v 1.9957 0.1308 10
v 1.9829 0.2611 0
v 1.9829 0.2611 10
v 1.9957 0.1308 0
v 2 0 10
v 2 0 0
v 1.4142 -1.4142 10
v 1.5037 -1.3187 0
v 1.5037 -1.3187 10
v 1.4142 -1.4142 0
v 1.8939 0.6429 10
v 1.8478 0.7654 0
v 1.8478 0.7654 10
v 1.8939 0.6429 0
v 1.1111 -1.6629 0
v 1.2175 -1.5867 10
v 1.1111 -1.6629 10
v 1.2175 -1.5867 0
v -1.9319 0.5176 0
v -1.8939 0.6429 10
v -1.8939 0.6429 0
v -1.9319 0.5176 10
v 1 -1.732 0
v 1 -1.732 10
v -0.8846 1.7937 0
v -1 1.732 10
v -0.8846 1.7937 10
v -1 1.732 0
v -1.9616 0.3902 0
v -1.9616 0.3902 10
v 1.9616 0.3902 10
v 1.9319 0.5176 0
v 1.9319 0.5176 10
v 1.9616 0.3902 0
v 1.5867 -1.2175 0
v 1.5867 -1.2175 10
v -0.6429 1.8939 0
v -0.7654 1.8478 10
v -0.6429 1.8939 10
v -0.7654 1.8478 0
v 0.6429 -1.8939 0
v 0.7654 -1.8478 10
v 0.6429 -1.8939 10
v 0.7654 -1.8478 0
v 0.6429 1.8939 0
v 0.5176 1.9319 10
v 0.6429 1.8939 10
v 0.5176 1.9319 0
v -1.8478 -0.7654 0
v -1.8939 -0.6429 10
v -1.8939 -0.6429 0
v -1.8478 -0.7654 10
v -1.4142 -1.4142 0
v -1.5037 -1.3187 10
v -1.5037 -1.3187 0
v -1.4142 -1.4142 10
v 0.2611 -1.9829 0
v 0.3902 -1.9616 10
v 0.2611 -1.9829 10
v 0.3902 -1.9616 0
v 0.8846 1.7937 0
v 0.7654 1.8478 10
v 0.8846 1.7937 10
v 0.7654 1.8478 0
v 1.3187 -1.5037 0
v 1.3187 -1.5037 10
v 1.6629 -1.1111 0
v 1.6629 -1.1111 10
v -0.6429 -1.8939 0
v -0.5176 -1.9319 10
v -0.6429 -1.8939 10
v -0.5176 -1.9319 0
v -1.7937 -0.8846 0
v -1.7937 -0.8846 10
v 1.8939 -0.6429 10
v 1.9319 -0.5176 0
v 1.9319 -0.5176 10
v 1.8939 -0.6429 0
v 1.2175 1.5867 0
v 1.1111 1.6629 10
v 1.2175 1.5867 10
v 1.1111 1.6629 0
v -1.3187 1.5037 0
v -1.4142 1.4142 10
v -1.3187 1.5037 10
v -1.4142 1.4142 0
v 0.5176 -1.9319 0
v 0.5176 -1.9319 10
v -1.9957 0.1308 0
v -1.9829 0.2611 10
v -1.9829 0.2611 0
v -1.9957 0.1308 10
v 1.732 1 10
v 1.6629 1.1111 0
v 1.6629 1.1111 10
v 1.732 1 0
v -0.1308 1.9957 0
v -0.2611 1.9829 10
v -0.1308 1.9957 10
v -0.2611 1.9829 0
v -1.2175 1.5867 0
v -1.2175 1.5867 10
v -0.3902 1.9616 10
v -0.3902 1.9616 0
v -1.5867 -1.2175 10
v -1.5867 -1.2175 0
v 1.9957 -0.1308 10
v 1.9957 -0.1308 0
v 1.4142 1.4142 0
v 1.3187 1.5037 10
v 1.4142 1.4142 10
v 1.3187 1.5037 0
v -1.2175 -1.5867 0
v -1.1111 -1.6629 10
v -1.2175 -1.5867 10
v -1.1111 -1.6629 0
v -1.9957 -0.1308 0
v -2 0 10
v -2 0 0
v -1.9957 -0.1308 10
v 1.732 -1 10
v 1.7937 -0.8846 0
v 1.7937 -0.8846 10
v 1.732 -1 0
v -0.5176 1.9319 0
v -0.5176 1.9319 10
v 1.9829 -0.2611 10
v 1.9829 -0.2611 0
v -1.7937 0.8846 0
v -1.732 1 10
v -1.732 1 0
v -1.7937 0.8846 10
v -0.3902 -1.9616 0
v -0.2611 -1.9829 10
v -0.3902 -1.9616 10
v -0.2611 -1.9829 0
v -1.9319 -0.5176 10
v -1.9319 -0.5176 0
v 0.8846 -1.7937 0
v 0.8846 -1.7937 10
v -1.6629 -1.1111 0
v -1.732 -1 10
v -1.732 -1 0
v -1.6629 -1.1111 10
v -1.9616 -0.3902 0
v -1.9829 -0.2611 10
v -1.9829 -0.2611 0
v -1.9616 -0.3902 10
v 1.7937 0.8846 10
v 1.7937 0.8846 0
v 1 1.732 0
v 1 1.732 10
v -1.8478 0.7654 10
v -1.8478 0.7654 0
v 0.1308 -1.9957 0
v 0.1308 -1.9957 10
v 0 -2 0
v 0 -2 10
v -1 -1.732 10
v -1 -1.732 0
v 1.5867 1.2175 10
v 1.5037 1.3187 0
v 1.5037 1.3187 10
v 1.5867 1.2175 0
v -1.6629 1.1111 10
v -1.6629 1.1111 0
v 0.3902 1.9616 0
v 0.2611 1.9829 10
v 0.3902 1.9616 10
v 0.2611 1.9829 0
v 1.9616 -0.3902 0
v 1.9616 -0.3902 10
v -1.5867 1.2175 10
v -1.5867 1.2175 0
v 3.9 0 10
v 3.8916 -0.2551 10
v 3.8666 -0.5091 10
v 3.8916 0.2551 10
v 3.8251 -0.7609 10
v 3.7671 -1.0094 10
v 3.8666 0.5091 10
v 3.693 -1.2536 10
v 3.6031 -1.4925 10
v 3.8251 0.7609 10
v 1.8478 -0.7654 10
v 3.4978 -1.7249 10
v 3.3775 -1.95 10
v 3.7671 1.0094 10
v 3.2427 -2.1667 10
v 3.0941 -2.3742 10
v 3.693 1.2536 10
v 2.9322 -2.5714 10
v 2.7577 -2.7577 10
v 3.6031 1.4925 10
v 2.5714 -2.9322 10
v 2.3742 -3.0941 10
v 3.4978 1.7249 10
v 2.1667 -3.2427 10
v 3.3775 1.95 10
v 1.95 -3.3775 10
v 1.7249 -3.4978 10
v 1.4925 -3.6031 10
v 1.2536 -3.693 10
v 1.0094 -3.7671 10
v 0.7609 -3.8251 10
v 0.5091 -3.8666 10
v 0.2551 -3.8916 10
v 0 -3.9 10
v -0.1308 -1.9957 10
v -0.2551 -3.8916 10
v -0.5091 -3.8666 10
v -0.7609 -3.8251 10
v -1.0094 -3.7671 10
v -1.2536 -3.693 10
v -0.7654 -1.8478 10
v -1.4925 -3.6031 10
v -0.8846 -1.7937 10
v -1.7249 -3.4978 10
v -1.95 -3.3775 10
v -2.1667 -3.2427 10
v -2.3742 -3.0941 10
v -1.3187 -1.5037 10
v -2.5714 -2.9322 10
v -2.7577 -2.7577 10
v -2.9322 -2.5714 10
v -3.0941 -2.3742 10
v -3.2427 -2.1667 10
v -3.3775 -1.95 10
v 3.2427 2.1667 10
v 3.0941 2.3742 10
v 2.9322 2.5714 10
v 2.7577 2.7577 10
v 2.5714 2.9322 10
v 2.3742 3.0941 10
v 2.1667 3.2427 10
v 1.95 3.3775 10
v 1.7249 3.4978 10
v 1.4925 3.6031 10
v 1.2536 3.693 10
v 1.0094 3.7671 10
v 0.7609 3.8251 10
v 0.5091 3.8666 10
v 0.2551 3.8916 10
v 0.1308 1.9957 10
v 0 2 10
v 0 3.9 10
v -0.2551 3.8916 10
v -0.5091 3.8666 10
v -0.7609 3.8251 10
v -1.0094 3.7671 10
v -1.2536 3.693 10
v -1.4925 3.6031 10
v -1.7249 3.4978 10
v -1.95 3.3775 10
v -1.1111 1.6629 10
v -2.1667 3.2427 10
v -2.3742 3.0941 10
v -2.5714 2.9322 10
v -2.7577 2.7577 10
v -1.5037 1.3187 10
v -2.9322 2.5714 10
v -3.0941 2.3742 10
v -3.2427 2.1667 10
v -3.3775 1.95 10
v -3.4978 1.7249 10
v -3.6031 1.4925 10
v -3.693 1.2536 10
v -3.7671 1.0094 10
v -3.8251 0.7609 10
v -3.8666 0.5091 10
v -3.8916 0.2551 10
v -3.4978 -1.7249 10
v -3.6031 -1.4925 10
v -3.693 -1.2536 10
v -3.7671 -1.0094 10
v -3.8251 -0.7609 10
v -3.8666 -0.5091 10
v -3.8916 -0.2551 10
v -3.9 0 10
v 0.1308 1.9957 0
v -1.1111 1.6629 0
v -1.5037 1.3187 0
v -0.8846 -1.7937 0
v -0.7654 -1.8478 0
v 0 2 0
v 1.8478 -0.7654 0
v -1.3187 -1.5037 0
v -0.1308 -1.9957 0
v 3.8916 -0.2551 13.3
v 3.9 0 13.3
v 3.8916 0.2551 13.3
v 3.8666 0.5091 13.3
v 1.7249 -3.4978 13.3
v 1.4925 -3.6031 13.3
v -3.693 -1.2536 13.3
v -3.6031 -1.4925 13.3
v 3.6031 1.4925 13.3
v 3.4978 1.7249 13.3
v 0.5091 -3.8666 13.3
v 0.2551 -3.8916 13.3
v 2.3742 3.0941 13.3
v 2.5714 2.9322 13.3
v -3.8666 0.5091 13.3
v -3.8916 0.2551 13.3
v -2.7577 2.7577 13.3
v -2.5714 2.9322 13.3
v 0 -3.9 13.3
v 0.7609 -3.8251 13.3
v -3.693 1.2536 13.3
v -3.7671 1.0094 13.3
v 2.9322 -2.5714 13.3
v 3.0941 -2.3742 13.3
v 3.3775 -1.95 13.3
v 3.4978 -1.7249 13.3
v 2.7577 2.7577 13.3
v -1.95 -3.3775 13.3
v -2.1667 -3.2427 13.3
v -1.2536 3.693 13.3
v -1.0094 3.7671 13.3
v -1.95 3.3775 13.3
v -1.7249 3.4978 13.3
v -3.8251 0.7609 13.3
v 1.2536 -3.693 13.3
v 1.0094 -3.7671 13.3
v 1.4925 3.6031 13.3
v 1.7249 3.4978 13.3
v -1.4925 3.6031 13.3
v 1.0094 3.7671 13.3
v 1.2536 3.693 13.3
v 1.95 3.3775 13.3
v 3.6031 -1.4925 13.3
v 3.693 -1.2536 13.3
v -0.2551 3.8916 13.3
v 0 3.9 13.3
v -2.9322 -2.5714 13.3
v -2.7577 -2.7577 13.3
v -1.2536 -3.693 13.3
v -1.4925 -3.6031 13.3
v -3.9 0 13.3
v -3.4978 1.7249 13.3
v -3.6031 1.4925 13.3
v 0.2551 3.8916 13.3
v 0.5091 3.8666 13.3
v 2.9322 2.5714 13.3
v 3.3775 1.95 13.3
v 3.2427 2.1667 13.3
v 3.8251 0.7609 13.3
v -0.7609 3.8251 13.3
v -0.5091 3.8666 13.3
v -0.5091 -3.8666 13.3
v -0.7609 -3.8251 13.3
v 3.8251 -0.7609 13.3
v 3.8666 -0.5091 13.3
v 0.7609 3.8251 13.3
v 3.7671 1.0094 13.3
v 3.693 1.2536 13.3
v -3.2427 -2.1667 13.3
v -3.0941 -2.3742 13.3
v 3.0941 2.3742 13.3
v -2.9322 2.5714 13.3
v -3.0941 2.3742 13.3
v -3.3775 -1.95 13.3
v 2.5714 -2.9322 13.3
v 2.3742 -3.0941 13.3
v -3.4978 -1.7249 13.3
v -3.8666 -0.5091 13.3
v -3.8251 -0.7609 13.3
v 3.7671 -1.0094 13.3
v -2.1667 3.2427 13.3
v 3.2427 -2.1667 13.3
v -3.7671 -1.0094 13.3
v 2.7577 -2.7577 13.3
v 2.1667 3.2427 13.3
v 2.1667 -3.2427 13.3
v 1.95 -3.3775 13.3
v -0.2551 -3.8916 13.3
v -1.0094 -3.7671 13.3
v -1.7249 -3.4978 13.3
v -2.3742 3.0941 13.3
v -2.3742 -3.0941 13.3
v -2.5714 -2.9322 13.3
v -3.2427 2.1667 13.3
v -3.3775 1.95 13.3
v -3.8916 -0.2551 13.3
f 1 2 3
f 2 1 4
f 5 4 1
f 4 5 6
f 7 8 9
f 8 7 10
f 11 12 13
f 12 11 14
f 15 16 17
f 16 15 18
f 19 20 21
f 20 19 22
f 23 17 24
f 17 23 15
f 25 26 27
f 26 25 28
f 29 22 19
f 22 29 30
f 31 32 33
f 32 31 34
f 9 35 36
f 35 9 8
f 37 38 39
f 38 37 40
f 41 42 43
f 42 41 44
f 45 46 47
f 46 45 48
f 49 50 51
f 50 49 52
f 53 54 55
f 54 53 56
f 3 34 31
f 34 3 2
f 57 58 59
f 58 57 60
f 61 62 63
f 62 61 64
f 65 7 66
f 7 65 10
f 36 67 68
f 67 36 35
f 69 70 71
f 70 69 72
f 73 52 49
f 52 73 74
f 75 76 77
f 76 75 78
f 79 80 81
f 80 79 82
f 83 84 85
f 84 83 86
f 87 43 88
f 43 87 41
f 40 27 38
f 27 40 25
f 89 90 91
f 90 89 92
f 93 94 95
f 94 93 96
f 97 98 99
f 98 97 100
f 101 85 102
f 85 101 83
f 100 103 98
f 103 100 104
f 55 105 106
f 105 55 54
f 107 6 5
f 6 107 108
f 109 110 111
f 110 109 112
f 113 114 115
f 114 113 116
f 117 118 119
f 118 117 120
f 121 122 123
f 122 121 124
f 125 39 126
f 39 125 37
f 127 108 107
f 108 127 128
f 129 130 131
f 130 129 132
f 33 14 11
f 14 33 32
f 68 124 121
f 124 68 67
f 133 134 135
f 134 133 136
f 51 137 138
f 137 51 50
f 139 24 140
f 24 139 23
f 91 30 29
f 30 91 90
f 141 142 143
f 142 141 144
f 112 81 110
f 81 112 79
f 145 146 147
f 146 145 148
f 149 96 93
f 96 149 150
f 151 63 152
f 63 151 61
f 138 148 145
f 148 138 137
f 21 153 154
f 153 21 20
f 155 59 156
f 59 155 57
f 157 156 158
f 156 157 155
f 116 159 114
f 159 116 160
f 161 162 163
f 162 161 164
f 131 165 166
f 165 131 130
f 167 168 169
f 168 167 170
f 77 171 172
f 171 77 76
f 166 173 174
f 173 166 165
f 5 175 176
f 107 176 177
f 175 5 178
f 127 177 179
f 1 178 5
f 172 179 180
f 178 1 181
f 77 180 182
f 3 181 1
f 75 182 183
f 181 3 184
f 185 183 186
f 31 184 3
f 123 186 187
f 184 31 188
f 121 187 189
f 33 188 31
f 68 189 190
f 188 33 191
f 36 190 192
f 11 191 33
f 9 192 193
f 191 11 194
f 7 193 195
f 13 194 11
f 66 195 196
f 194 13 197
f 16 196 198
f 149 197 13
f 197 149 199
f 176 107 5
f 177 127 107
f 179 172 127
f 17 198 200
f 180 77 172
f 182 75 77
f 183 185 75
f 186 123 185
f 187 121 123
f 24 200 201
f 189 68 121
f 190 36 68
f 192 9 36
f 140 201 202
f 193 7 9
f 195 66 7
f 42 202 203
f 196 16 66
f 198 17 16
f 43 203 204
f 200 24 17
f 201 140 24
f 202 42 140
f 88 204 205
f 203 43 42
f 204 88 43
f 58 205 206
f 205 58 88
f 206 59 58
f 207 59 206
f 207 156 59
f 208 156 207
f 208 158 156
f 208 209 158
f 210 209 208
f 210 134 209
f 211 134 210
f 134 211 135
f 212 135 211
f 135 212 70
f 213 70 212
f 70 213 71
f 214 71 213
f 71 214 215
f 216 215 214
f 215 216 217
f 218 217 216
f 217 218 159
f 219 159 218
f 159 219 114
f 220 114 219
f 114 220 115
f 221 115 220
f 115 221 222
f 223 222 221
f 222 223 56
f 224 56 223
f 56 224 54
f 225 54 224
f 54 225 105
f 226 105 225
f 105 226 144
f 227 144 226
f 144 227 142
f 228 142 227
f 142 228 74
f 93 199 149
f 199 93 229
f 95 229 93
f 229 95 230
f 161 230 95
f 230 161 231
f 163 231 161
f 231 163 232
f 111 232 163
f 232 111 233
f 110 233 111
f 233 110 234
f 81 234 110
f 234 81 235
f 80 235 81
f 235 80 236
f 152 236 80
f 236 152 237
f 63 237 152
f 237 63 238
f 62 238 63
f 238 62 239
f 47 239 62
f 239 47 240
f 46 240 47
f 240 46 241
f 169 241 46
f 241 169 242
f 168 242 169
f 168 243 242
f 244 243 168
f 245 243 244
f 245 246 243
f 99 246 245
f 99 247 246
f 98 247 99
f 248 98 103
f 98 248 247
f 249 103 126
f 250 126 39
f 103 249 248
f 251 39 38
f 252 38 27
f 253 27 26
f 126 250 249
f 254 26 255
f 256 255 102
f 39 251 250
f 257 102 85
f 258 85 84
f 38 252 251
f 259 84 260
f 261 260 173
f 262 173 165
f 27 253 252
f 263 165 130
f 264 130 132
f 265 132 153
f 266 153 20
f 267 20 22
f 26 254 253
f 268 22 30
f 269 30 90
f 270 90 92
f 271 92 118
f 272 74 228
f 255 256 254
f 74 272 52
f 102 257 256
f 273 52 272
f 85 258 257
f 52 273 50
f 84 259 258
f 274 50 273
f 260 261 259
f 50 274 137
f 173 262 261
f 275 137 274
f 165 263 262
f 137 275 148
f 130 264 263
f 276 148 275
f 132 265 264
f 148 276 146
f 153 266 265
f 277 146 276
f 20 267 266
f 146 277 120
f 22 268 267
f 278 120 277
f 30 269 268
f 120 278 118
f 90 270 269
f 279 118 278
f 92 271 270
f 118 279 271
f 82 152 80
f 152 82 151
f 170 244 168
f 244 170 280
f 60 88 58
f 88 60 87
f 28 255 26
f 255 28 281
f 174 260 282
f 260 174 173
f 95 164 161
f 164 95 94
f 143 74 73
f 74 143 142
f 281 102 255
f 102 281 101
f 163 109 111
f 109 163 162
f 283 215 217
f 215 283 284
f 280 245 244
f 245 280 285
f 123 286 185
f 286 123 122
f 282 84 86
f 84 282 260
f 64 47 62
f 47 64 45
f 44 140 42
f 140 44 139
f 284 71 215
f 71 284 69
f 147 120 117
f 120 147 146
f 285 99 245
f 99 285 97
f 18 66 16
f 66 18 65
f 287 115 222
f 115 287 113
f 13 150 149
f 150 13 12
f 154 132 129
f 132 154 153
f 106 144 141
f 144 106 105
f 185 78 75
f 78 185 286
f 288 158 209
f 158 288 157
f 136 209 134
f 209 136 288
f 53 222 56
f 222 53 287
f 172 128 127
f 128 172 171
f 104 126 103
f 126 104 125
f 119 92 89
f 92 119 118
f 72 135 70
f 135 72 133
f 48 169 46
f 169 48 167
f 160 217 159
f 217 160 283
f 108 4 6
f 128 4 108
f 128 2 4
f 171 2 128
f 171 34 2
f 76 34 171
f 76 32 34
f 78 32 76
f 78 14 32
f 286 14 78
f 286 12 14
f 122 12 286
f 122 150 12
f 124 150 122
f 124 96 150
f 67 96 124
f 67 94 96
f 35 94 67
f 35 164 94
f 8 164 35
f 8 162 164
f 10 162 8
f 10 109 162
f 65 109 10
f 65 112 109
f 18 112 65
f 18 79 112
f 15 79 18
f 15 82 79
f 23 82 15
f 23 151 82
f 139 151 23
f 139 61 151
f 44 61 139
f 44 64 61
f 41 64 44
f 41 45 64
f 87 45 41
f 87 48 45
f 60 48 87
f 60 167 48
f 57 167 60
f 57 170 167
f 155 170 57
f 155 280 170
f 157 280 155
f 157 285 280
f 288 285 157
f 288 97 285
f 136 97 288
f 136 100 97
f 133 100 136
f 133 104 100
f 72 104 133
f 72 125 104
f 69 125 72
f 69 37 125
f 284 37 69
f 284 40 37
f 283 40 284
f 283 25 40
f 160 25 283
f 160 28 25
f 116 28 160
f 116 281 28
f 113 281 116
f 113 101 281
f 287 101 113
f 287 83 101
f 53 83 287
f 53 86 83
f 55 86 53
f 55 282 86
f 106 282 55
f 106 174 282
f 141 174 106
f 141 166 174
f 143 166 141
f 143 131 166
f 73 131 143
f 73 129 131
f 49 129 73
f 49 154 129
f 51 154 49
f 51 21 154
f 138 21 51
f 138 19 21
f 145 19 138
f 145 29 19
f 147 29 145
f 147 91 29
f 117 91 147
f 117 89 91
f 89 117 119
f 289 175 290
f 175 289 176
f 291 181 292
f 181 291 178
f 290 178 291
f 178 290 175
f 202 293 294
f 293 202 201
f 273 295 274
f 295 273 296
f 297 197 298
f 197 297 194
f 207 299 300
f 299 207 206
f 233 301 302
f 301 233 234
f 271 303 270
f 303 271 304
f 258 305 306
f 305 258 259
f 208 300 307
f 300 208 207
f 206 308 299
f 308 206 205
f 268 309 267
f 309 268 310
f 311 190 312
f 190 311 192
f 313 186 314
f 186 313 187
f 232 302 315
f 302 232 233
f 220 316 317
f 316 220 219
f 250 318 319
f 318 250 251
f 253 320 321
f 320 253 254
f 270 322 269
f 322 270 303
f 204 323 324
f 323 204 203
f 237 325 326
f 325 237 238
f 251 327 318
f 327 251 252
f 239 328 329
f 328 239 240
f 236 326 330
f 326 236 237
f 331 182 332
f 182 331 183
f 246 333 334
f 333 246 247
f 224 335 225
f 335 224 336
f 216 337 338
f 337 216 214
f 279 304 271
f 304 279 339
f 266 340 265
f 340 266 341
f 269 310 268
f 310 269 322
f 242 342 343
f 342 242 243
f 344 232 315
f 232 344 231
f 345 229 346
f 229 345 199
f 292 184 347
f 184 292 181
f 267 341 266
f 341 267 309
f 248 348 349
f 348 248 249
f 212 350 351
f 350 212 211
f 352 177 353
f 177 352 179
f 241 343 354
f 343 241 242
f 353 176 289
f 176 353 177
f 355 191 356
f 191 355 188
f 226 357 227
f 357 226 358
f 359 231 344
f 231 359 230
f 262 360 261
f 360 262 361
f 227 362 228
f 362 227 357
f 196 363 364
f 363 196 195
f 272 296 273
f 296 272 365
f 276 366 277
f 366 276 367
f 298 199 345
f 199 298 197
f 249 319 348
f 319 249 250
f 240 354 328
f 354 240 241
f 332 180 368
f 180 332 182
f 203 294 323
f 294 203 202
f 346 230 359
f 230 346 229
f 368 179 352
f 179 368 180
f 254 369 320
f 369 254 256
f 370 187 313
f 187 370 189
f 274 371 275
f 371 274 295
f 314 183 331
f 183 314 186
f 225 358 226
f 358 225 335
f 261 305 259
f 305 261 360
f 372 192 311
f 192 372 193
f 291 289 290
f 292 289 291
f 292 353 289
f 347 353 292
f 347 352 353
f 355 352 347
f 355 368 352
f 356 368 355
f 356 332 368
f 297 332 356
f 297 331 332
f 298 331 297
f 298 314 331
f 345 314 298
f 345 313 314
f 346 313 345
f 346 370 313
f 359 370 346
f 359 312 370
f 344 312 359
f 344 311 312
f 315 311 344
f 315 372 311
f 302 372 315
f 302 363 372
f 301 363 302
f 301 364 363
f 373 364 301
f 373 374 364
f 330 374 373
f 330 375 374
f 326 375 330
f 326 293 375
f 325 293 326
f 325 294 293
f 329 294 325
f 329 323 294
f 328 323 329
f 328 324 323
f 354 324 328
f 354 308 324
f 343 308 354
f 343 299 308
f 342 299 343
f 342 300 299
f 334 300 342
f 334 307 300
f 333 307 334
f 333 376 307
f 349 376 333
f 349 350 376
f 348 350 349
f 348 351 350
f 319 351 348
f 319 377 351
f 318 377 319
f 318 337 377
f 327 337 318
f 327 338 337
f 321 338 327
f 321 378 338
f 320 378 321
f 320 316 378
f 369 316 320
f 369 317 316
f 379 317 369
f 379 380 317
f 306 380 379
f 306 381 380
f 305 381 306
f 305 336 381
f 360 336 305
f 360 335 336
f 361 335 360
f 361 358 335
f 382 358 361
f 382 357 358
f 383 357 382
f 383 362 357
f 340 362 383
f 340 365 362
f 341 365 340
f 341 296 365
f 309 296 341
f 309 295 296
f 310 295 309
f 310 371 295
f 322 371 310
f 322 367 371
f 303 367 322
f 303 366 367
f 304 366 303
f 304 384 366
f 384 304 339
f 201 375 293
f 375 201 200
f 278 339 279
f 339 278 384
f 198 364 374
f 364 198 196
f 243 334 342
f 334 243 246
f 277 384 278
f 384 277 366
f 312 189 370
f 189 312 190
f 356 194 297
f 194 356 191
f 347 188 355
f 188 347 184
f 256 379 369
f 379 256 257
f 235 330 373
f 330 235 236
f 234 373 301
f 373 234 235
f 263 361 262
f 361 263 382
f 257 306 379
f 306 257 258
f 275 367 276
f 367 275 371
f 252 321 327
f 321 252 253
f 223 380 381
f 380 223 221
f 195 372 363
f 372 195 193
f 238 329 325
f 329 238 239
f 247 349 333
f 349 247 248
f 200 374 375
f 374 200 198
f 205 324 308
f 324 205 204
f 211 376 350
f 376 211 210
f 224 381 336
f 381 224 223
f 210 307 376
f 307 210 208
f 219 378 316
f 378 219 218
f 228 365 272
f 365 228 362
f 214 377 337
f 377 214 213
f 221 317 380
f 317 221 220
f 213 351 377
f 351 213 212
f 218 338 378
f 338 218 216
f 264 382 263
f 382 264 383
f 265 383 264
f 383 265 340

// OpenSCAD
$fn = 96;

// Dimensions (mm)
shaft_d = 4.0;
length = 10.0;

head_d = 7.8;
head_h = 3.3;

// Simple pan head approximation: cylindrical head with rounded top edge
module pan_head_screw(shaft_d, length, head_d, head_h) {
    union() {
        // Shaft
        cylinder(h = length, d = shaft_d);

        // Head (base cylinder)
        translate([0,0,length])
            cylinder(h = head_h, d = head_d);

        // Rounded top (torus-like fillet via rotate_extrude)
        // Fillet radius chosen as a fraction of head height
        fillet_r = min(head_h * 0.45, (head_d - shaft_d) * 0.25);
        translate([0,0,length + head_h - fillet_r])
            rotate_extrude(angle = 360)
                translate([head_d/2 - fillet_r, 0, 0])
                    circle(r = fillet_r);
    }
}

pan_head_screw(shaft_d, length, head_d, head_h);
